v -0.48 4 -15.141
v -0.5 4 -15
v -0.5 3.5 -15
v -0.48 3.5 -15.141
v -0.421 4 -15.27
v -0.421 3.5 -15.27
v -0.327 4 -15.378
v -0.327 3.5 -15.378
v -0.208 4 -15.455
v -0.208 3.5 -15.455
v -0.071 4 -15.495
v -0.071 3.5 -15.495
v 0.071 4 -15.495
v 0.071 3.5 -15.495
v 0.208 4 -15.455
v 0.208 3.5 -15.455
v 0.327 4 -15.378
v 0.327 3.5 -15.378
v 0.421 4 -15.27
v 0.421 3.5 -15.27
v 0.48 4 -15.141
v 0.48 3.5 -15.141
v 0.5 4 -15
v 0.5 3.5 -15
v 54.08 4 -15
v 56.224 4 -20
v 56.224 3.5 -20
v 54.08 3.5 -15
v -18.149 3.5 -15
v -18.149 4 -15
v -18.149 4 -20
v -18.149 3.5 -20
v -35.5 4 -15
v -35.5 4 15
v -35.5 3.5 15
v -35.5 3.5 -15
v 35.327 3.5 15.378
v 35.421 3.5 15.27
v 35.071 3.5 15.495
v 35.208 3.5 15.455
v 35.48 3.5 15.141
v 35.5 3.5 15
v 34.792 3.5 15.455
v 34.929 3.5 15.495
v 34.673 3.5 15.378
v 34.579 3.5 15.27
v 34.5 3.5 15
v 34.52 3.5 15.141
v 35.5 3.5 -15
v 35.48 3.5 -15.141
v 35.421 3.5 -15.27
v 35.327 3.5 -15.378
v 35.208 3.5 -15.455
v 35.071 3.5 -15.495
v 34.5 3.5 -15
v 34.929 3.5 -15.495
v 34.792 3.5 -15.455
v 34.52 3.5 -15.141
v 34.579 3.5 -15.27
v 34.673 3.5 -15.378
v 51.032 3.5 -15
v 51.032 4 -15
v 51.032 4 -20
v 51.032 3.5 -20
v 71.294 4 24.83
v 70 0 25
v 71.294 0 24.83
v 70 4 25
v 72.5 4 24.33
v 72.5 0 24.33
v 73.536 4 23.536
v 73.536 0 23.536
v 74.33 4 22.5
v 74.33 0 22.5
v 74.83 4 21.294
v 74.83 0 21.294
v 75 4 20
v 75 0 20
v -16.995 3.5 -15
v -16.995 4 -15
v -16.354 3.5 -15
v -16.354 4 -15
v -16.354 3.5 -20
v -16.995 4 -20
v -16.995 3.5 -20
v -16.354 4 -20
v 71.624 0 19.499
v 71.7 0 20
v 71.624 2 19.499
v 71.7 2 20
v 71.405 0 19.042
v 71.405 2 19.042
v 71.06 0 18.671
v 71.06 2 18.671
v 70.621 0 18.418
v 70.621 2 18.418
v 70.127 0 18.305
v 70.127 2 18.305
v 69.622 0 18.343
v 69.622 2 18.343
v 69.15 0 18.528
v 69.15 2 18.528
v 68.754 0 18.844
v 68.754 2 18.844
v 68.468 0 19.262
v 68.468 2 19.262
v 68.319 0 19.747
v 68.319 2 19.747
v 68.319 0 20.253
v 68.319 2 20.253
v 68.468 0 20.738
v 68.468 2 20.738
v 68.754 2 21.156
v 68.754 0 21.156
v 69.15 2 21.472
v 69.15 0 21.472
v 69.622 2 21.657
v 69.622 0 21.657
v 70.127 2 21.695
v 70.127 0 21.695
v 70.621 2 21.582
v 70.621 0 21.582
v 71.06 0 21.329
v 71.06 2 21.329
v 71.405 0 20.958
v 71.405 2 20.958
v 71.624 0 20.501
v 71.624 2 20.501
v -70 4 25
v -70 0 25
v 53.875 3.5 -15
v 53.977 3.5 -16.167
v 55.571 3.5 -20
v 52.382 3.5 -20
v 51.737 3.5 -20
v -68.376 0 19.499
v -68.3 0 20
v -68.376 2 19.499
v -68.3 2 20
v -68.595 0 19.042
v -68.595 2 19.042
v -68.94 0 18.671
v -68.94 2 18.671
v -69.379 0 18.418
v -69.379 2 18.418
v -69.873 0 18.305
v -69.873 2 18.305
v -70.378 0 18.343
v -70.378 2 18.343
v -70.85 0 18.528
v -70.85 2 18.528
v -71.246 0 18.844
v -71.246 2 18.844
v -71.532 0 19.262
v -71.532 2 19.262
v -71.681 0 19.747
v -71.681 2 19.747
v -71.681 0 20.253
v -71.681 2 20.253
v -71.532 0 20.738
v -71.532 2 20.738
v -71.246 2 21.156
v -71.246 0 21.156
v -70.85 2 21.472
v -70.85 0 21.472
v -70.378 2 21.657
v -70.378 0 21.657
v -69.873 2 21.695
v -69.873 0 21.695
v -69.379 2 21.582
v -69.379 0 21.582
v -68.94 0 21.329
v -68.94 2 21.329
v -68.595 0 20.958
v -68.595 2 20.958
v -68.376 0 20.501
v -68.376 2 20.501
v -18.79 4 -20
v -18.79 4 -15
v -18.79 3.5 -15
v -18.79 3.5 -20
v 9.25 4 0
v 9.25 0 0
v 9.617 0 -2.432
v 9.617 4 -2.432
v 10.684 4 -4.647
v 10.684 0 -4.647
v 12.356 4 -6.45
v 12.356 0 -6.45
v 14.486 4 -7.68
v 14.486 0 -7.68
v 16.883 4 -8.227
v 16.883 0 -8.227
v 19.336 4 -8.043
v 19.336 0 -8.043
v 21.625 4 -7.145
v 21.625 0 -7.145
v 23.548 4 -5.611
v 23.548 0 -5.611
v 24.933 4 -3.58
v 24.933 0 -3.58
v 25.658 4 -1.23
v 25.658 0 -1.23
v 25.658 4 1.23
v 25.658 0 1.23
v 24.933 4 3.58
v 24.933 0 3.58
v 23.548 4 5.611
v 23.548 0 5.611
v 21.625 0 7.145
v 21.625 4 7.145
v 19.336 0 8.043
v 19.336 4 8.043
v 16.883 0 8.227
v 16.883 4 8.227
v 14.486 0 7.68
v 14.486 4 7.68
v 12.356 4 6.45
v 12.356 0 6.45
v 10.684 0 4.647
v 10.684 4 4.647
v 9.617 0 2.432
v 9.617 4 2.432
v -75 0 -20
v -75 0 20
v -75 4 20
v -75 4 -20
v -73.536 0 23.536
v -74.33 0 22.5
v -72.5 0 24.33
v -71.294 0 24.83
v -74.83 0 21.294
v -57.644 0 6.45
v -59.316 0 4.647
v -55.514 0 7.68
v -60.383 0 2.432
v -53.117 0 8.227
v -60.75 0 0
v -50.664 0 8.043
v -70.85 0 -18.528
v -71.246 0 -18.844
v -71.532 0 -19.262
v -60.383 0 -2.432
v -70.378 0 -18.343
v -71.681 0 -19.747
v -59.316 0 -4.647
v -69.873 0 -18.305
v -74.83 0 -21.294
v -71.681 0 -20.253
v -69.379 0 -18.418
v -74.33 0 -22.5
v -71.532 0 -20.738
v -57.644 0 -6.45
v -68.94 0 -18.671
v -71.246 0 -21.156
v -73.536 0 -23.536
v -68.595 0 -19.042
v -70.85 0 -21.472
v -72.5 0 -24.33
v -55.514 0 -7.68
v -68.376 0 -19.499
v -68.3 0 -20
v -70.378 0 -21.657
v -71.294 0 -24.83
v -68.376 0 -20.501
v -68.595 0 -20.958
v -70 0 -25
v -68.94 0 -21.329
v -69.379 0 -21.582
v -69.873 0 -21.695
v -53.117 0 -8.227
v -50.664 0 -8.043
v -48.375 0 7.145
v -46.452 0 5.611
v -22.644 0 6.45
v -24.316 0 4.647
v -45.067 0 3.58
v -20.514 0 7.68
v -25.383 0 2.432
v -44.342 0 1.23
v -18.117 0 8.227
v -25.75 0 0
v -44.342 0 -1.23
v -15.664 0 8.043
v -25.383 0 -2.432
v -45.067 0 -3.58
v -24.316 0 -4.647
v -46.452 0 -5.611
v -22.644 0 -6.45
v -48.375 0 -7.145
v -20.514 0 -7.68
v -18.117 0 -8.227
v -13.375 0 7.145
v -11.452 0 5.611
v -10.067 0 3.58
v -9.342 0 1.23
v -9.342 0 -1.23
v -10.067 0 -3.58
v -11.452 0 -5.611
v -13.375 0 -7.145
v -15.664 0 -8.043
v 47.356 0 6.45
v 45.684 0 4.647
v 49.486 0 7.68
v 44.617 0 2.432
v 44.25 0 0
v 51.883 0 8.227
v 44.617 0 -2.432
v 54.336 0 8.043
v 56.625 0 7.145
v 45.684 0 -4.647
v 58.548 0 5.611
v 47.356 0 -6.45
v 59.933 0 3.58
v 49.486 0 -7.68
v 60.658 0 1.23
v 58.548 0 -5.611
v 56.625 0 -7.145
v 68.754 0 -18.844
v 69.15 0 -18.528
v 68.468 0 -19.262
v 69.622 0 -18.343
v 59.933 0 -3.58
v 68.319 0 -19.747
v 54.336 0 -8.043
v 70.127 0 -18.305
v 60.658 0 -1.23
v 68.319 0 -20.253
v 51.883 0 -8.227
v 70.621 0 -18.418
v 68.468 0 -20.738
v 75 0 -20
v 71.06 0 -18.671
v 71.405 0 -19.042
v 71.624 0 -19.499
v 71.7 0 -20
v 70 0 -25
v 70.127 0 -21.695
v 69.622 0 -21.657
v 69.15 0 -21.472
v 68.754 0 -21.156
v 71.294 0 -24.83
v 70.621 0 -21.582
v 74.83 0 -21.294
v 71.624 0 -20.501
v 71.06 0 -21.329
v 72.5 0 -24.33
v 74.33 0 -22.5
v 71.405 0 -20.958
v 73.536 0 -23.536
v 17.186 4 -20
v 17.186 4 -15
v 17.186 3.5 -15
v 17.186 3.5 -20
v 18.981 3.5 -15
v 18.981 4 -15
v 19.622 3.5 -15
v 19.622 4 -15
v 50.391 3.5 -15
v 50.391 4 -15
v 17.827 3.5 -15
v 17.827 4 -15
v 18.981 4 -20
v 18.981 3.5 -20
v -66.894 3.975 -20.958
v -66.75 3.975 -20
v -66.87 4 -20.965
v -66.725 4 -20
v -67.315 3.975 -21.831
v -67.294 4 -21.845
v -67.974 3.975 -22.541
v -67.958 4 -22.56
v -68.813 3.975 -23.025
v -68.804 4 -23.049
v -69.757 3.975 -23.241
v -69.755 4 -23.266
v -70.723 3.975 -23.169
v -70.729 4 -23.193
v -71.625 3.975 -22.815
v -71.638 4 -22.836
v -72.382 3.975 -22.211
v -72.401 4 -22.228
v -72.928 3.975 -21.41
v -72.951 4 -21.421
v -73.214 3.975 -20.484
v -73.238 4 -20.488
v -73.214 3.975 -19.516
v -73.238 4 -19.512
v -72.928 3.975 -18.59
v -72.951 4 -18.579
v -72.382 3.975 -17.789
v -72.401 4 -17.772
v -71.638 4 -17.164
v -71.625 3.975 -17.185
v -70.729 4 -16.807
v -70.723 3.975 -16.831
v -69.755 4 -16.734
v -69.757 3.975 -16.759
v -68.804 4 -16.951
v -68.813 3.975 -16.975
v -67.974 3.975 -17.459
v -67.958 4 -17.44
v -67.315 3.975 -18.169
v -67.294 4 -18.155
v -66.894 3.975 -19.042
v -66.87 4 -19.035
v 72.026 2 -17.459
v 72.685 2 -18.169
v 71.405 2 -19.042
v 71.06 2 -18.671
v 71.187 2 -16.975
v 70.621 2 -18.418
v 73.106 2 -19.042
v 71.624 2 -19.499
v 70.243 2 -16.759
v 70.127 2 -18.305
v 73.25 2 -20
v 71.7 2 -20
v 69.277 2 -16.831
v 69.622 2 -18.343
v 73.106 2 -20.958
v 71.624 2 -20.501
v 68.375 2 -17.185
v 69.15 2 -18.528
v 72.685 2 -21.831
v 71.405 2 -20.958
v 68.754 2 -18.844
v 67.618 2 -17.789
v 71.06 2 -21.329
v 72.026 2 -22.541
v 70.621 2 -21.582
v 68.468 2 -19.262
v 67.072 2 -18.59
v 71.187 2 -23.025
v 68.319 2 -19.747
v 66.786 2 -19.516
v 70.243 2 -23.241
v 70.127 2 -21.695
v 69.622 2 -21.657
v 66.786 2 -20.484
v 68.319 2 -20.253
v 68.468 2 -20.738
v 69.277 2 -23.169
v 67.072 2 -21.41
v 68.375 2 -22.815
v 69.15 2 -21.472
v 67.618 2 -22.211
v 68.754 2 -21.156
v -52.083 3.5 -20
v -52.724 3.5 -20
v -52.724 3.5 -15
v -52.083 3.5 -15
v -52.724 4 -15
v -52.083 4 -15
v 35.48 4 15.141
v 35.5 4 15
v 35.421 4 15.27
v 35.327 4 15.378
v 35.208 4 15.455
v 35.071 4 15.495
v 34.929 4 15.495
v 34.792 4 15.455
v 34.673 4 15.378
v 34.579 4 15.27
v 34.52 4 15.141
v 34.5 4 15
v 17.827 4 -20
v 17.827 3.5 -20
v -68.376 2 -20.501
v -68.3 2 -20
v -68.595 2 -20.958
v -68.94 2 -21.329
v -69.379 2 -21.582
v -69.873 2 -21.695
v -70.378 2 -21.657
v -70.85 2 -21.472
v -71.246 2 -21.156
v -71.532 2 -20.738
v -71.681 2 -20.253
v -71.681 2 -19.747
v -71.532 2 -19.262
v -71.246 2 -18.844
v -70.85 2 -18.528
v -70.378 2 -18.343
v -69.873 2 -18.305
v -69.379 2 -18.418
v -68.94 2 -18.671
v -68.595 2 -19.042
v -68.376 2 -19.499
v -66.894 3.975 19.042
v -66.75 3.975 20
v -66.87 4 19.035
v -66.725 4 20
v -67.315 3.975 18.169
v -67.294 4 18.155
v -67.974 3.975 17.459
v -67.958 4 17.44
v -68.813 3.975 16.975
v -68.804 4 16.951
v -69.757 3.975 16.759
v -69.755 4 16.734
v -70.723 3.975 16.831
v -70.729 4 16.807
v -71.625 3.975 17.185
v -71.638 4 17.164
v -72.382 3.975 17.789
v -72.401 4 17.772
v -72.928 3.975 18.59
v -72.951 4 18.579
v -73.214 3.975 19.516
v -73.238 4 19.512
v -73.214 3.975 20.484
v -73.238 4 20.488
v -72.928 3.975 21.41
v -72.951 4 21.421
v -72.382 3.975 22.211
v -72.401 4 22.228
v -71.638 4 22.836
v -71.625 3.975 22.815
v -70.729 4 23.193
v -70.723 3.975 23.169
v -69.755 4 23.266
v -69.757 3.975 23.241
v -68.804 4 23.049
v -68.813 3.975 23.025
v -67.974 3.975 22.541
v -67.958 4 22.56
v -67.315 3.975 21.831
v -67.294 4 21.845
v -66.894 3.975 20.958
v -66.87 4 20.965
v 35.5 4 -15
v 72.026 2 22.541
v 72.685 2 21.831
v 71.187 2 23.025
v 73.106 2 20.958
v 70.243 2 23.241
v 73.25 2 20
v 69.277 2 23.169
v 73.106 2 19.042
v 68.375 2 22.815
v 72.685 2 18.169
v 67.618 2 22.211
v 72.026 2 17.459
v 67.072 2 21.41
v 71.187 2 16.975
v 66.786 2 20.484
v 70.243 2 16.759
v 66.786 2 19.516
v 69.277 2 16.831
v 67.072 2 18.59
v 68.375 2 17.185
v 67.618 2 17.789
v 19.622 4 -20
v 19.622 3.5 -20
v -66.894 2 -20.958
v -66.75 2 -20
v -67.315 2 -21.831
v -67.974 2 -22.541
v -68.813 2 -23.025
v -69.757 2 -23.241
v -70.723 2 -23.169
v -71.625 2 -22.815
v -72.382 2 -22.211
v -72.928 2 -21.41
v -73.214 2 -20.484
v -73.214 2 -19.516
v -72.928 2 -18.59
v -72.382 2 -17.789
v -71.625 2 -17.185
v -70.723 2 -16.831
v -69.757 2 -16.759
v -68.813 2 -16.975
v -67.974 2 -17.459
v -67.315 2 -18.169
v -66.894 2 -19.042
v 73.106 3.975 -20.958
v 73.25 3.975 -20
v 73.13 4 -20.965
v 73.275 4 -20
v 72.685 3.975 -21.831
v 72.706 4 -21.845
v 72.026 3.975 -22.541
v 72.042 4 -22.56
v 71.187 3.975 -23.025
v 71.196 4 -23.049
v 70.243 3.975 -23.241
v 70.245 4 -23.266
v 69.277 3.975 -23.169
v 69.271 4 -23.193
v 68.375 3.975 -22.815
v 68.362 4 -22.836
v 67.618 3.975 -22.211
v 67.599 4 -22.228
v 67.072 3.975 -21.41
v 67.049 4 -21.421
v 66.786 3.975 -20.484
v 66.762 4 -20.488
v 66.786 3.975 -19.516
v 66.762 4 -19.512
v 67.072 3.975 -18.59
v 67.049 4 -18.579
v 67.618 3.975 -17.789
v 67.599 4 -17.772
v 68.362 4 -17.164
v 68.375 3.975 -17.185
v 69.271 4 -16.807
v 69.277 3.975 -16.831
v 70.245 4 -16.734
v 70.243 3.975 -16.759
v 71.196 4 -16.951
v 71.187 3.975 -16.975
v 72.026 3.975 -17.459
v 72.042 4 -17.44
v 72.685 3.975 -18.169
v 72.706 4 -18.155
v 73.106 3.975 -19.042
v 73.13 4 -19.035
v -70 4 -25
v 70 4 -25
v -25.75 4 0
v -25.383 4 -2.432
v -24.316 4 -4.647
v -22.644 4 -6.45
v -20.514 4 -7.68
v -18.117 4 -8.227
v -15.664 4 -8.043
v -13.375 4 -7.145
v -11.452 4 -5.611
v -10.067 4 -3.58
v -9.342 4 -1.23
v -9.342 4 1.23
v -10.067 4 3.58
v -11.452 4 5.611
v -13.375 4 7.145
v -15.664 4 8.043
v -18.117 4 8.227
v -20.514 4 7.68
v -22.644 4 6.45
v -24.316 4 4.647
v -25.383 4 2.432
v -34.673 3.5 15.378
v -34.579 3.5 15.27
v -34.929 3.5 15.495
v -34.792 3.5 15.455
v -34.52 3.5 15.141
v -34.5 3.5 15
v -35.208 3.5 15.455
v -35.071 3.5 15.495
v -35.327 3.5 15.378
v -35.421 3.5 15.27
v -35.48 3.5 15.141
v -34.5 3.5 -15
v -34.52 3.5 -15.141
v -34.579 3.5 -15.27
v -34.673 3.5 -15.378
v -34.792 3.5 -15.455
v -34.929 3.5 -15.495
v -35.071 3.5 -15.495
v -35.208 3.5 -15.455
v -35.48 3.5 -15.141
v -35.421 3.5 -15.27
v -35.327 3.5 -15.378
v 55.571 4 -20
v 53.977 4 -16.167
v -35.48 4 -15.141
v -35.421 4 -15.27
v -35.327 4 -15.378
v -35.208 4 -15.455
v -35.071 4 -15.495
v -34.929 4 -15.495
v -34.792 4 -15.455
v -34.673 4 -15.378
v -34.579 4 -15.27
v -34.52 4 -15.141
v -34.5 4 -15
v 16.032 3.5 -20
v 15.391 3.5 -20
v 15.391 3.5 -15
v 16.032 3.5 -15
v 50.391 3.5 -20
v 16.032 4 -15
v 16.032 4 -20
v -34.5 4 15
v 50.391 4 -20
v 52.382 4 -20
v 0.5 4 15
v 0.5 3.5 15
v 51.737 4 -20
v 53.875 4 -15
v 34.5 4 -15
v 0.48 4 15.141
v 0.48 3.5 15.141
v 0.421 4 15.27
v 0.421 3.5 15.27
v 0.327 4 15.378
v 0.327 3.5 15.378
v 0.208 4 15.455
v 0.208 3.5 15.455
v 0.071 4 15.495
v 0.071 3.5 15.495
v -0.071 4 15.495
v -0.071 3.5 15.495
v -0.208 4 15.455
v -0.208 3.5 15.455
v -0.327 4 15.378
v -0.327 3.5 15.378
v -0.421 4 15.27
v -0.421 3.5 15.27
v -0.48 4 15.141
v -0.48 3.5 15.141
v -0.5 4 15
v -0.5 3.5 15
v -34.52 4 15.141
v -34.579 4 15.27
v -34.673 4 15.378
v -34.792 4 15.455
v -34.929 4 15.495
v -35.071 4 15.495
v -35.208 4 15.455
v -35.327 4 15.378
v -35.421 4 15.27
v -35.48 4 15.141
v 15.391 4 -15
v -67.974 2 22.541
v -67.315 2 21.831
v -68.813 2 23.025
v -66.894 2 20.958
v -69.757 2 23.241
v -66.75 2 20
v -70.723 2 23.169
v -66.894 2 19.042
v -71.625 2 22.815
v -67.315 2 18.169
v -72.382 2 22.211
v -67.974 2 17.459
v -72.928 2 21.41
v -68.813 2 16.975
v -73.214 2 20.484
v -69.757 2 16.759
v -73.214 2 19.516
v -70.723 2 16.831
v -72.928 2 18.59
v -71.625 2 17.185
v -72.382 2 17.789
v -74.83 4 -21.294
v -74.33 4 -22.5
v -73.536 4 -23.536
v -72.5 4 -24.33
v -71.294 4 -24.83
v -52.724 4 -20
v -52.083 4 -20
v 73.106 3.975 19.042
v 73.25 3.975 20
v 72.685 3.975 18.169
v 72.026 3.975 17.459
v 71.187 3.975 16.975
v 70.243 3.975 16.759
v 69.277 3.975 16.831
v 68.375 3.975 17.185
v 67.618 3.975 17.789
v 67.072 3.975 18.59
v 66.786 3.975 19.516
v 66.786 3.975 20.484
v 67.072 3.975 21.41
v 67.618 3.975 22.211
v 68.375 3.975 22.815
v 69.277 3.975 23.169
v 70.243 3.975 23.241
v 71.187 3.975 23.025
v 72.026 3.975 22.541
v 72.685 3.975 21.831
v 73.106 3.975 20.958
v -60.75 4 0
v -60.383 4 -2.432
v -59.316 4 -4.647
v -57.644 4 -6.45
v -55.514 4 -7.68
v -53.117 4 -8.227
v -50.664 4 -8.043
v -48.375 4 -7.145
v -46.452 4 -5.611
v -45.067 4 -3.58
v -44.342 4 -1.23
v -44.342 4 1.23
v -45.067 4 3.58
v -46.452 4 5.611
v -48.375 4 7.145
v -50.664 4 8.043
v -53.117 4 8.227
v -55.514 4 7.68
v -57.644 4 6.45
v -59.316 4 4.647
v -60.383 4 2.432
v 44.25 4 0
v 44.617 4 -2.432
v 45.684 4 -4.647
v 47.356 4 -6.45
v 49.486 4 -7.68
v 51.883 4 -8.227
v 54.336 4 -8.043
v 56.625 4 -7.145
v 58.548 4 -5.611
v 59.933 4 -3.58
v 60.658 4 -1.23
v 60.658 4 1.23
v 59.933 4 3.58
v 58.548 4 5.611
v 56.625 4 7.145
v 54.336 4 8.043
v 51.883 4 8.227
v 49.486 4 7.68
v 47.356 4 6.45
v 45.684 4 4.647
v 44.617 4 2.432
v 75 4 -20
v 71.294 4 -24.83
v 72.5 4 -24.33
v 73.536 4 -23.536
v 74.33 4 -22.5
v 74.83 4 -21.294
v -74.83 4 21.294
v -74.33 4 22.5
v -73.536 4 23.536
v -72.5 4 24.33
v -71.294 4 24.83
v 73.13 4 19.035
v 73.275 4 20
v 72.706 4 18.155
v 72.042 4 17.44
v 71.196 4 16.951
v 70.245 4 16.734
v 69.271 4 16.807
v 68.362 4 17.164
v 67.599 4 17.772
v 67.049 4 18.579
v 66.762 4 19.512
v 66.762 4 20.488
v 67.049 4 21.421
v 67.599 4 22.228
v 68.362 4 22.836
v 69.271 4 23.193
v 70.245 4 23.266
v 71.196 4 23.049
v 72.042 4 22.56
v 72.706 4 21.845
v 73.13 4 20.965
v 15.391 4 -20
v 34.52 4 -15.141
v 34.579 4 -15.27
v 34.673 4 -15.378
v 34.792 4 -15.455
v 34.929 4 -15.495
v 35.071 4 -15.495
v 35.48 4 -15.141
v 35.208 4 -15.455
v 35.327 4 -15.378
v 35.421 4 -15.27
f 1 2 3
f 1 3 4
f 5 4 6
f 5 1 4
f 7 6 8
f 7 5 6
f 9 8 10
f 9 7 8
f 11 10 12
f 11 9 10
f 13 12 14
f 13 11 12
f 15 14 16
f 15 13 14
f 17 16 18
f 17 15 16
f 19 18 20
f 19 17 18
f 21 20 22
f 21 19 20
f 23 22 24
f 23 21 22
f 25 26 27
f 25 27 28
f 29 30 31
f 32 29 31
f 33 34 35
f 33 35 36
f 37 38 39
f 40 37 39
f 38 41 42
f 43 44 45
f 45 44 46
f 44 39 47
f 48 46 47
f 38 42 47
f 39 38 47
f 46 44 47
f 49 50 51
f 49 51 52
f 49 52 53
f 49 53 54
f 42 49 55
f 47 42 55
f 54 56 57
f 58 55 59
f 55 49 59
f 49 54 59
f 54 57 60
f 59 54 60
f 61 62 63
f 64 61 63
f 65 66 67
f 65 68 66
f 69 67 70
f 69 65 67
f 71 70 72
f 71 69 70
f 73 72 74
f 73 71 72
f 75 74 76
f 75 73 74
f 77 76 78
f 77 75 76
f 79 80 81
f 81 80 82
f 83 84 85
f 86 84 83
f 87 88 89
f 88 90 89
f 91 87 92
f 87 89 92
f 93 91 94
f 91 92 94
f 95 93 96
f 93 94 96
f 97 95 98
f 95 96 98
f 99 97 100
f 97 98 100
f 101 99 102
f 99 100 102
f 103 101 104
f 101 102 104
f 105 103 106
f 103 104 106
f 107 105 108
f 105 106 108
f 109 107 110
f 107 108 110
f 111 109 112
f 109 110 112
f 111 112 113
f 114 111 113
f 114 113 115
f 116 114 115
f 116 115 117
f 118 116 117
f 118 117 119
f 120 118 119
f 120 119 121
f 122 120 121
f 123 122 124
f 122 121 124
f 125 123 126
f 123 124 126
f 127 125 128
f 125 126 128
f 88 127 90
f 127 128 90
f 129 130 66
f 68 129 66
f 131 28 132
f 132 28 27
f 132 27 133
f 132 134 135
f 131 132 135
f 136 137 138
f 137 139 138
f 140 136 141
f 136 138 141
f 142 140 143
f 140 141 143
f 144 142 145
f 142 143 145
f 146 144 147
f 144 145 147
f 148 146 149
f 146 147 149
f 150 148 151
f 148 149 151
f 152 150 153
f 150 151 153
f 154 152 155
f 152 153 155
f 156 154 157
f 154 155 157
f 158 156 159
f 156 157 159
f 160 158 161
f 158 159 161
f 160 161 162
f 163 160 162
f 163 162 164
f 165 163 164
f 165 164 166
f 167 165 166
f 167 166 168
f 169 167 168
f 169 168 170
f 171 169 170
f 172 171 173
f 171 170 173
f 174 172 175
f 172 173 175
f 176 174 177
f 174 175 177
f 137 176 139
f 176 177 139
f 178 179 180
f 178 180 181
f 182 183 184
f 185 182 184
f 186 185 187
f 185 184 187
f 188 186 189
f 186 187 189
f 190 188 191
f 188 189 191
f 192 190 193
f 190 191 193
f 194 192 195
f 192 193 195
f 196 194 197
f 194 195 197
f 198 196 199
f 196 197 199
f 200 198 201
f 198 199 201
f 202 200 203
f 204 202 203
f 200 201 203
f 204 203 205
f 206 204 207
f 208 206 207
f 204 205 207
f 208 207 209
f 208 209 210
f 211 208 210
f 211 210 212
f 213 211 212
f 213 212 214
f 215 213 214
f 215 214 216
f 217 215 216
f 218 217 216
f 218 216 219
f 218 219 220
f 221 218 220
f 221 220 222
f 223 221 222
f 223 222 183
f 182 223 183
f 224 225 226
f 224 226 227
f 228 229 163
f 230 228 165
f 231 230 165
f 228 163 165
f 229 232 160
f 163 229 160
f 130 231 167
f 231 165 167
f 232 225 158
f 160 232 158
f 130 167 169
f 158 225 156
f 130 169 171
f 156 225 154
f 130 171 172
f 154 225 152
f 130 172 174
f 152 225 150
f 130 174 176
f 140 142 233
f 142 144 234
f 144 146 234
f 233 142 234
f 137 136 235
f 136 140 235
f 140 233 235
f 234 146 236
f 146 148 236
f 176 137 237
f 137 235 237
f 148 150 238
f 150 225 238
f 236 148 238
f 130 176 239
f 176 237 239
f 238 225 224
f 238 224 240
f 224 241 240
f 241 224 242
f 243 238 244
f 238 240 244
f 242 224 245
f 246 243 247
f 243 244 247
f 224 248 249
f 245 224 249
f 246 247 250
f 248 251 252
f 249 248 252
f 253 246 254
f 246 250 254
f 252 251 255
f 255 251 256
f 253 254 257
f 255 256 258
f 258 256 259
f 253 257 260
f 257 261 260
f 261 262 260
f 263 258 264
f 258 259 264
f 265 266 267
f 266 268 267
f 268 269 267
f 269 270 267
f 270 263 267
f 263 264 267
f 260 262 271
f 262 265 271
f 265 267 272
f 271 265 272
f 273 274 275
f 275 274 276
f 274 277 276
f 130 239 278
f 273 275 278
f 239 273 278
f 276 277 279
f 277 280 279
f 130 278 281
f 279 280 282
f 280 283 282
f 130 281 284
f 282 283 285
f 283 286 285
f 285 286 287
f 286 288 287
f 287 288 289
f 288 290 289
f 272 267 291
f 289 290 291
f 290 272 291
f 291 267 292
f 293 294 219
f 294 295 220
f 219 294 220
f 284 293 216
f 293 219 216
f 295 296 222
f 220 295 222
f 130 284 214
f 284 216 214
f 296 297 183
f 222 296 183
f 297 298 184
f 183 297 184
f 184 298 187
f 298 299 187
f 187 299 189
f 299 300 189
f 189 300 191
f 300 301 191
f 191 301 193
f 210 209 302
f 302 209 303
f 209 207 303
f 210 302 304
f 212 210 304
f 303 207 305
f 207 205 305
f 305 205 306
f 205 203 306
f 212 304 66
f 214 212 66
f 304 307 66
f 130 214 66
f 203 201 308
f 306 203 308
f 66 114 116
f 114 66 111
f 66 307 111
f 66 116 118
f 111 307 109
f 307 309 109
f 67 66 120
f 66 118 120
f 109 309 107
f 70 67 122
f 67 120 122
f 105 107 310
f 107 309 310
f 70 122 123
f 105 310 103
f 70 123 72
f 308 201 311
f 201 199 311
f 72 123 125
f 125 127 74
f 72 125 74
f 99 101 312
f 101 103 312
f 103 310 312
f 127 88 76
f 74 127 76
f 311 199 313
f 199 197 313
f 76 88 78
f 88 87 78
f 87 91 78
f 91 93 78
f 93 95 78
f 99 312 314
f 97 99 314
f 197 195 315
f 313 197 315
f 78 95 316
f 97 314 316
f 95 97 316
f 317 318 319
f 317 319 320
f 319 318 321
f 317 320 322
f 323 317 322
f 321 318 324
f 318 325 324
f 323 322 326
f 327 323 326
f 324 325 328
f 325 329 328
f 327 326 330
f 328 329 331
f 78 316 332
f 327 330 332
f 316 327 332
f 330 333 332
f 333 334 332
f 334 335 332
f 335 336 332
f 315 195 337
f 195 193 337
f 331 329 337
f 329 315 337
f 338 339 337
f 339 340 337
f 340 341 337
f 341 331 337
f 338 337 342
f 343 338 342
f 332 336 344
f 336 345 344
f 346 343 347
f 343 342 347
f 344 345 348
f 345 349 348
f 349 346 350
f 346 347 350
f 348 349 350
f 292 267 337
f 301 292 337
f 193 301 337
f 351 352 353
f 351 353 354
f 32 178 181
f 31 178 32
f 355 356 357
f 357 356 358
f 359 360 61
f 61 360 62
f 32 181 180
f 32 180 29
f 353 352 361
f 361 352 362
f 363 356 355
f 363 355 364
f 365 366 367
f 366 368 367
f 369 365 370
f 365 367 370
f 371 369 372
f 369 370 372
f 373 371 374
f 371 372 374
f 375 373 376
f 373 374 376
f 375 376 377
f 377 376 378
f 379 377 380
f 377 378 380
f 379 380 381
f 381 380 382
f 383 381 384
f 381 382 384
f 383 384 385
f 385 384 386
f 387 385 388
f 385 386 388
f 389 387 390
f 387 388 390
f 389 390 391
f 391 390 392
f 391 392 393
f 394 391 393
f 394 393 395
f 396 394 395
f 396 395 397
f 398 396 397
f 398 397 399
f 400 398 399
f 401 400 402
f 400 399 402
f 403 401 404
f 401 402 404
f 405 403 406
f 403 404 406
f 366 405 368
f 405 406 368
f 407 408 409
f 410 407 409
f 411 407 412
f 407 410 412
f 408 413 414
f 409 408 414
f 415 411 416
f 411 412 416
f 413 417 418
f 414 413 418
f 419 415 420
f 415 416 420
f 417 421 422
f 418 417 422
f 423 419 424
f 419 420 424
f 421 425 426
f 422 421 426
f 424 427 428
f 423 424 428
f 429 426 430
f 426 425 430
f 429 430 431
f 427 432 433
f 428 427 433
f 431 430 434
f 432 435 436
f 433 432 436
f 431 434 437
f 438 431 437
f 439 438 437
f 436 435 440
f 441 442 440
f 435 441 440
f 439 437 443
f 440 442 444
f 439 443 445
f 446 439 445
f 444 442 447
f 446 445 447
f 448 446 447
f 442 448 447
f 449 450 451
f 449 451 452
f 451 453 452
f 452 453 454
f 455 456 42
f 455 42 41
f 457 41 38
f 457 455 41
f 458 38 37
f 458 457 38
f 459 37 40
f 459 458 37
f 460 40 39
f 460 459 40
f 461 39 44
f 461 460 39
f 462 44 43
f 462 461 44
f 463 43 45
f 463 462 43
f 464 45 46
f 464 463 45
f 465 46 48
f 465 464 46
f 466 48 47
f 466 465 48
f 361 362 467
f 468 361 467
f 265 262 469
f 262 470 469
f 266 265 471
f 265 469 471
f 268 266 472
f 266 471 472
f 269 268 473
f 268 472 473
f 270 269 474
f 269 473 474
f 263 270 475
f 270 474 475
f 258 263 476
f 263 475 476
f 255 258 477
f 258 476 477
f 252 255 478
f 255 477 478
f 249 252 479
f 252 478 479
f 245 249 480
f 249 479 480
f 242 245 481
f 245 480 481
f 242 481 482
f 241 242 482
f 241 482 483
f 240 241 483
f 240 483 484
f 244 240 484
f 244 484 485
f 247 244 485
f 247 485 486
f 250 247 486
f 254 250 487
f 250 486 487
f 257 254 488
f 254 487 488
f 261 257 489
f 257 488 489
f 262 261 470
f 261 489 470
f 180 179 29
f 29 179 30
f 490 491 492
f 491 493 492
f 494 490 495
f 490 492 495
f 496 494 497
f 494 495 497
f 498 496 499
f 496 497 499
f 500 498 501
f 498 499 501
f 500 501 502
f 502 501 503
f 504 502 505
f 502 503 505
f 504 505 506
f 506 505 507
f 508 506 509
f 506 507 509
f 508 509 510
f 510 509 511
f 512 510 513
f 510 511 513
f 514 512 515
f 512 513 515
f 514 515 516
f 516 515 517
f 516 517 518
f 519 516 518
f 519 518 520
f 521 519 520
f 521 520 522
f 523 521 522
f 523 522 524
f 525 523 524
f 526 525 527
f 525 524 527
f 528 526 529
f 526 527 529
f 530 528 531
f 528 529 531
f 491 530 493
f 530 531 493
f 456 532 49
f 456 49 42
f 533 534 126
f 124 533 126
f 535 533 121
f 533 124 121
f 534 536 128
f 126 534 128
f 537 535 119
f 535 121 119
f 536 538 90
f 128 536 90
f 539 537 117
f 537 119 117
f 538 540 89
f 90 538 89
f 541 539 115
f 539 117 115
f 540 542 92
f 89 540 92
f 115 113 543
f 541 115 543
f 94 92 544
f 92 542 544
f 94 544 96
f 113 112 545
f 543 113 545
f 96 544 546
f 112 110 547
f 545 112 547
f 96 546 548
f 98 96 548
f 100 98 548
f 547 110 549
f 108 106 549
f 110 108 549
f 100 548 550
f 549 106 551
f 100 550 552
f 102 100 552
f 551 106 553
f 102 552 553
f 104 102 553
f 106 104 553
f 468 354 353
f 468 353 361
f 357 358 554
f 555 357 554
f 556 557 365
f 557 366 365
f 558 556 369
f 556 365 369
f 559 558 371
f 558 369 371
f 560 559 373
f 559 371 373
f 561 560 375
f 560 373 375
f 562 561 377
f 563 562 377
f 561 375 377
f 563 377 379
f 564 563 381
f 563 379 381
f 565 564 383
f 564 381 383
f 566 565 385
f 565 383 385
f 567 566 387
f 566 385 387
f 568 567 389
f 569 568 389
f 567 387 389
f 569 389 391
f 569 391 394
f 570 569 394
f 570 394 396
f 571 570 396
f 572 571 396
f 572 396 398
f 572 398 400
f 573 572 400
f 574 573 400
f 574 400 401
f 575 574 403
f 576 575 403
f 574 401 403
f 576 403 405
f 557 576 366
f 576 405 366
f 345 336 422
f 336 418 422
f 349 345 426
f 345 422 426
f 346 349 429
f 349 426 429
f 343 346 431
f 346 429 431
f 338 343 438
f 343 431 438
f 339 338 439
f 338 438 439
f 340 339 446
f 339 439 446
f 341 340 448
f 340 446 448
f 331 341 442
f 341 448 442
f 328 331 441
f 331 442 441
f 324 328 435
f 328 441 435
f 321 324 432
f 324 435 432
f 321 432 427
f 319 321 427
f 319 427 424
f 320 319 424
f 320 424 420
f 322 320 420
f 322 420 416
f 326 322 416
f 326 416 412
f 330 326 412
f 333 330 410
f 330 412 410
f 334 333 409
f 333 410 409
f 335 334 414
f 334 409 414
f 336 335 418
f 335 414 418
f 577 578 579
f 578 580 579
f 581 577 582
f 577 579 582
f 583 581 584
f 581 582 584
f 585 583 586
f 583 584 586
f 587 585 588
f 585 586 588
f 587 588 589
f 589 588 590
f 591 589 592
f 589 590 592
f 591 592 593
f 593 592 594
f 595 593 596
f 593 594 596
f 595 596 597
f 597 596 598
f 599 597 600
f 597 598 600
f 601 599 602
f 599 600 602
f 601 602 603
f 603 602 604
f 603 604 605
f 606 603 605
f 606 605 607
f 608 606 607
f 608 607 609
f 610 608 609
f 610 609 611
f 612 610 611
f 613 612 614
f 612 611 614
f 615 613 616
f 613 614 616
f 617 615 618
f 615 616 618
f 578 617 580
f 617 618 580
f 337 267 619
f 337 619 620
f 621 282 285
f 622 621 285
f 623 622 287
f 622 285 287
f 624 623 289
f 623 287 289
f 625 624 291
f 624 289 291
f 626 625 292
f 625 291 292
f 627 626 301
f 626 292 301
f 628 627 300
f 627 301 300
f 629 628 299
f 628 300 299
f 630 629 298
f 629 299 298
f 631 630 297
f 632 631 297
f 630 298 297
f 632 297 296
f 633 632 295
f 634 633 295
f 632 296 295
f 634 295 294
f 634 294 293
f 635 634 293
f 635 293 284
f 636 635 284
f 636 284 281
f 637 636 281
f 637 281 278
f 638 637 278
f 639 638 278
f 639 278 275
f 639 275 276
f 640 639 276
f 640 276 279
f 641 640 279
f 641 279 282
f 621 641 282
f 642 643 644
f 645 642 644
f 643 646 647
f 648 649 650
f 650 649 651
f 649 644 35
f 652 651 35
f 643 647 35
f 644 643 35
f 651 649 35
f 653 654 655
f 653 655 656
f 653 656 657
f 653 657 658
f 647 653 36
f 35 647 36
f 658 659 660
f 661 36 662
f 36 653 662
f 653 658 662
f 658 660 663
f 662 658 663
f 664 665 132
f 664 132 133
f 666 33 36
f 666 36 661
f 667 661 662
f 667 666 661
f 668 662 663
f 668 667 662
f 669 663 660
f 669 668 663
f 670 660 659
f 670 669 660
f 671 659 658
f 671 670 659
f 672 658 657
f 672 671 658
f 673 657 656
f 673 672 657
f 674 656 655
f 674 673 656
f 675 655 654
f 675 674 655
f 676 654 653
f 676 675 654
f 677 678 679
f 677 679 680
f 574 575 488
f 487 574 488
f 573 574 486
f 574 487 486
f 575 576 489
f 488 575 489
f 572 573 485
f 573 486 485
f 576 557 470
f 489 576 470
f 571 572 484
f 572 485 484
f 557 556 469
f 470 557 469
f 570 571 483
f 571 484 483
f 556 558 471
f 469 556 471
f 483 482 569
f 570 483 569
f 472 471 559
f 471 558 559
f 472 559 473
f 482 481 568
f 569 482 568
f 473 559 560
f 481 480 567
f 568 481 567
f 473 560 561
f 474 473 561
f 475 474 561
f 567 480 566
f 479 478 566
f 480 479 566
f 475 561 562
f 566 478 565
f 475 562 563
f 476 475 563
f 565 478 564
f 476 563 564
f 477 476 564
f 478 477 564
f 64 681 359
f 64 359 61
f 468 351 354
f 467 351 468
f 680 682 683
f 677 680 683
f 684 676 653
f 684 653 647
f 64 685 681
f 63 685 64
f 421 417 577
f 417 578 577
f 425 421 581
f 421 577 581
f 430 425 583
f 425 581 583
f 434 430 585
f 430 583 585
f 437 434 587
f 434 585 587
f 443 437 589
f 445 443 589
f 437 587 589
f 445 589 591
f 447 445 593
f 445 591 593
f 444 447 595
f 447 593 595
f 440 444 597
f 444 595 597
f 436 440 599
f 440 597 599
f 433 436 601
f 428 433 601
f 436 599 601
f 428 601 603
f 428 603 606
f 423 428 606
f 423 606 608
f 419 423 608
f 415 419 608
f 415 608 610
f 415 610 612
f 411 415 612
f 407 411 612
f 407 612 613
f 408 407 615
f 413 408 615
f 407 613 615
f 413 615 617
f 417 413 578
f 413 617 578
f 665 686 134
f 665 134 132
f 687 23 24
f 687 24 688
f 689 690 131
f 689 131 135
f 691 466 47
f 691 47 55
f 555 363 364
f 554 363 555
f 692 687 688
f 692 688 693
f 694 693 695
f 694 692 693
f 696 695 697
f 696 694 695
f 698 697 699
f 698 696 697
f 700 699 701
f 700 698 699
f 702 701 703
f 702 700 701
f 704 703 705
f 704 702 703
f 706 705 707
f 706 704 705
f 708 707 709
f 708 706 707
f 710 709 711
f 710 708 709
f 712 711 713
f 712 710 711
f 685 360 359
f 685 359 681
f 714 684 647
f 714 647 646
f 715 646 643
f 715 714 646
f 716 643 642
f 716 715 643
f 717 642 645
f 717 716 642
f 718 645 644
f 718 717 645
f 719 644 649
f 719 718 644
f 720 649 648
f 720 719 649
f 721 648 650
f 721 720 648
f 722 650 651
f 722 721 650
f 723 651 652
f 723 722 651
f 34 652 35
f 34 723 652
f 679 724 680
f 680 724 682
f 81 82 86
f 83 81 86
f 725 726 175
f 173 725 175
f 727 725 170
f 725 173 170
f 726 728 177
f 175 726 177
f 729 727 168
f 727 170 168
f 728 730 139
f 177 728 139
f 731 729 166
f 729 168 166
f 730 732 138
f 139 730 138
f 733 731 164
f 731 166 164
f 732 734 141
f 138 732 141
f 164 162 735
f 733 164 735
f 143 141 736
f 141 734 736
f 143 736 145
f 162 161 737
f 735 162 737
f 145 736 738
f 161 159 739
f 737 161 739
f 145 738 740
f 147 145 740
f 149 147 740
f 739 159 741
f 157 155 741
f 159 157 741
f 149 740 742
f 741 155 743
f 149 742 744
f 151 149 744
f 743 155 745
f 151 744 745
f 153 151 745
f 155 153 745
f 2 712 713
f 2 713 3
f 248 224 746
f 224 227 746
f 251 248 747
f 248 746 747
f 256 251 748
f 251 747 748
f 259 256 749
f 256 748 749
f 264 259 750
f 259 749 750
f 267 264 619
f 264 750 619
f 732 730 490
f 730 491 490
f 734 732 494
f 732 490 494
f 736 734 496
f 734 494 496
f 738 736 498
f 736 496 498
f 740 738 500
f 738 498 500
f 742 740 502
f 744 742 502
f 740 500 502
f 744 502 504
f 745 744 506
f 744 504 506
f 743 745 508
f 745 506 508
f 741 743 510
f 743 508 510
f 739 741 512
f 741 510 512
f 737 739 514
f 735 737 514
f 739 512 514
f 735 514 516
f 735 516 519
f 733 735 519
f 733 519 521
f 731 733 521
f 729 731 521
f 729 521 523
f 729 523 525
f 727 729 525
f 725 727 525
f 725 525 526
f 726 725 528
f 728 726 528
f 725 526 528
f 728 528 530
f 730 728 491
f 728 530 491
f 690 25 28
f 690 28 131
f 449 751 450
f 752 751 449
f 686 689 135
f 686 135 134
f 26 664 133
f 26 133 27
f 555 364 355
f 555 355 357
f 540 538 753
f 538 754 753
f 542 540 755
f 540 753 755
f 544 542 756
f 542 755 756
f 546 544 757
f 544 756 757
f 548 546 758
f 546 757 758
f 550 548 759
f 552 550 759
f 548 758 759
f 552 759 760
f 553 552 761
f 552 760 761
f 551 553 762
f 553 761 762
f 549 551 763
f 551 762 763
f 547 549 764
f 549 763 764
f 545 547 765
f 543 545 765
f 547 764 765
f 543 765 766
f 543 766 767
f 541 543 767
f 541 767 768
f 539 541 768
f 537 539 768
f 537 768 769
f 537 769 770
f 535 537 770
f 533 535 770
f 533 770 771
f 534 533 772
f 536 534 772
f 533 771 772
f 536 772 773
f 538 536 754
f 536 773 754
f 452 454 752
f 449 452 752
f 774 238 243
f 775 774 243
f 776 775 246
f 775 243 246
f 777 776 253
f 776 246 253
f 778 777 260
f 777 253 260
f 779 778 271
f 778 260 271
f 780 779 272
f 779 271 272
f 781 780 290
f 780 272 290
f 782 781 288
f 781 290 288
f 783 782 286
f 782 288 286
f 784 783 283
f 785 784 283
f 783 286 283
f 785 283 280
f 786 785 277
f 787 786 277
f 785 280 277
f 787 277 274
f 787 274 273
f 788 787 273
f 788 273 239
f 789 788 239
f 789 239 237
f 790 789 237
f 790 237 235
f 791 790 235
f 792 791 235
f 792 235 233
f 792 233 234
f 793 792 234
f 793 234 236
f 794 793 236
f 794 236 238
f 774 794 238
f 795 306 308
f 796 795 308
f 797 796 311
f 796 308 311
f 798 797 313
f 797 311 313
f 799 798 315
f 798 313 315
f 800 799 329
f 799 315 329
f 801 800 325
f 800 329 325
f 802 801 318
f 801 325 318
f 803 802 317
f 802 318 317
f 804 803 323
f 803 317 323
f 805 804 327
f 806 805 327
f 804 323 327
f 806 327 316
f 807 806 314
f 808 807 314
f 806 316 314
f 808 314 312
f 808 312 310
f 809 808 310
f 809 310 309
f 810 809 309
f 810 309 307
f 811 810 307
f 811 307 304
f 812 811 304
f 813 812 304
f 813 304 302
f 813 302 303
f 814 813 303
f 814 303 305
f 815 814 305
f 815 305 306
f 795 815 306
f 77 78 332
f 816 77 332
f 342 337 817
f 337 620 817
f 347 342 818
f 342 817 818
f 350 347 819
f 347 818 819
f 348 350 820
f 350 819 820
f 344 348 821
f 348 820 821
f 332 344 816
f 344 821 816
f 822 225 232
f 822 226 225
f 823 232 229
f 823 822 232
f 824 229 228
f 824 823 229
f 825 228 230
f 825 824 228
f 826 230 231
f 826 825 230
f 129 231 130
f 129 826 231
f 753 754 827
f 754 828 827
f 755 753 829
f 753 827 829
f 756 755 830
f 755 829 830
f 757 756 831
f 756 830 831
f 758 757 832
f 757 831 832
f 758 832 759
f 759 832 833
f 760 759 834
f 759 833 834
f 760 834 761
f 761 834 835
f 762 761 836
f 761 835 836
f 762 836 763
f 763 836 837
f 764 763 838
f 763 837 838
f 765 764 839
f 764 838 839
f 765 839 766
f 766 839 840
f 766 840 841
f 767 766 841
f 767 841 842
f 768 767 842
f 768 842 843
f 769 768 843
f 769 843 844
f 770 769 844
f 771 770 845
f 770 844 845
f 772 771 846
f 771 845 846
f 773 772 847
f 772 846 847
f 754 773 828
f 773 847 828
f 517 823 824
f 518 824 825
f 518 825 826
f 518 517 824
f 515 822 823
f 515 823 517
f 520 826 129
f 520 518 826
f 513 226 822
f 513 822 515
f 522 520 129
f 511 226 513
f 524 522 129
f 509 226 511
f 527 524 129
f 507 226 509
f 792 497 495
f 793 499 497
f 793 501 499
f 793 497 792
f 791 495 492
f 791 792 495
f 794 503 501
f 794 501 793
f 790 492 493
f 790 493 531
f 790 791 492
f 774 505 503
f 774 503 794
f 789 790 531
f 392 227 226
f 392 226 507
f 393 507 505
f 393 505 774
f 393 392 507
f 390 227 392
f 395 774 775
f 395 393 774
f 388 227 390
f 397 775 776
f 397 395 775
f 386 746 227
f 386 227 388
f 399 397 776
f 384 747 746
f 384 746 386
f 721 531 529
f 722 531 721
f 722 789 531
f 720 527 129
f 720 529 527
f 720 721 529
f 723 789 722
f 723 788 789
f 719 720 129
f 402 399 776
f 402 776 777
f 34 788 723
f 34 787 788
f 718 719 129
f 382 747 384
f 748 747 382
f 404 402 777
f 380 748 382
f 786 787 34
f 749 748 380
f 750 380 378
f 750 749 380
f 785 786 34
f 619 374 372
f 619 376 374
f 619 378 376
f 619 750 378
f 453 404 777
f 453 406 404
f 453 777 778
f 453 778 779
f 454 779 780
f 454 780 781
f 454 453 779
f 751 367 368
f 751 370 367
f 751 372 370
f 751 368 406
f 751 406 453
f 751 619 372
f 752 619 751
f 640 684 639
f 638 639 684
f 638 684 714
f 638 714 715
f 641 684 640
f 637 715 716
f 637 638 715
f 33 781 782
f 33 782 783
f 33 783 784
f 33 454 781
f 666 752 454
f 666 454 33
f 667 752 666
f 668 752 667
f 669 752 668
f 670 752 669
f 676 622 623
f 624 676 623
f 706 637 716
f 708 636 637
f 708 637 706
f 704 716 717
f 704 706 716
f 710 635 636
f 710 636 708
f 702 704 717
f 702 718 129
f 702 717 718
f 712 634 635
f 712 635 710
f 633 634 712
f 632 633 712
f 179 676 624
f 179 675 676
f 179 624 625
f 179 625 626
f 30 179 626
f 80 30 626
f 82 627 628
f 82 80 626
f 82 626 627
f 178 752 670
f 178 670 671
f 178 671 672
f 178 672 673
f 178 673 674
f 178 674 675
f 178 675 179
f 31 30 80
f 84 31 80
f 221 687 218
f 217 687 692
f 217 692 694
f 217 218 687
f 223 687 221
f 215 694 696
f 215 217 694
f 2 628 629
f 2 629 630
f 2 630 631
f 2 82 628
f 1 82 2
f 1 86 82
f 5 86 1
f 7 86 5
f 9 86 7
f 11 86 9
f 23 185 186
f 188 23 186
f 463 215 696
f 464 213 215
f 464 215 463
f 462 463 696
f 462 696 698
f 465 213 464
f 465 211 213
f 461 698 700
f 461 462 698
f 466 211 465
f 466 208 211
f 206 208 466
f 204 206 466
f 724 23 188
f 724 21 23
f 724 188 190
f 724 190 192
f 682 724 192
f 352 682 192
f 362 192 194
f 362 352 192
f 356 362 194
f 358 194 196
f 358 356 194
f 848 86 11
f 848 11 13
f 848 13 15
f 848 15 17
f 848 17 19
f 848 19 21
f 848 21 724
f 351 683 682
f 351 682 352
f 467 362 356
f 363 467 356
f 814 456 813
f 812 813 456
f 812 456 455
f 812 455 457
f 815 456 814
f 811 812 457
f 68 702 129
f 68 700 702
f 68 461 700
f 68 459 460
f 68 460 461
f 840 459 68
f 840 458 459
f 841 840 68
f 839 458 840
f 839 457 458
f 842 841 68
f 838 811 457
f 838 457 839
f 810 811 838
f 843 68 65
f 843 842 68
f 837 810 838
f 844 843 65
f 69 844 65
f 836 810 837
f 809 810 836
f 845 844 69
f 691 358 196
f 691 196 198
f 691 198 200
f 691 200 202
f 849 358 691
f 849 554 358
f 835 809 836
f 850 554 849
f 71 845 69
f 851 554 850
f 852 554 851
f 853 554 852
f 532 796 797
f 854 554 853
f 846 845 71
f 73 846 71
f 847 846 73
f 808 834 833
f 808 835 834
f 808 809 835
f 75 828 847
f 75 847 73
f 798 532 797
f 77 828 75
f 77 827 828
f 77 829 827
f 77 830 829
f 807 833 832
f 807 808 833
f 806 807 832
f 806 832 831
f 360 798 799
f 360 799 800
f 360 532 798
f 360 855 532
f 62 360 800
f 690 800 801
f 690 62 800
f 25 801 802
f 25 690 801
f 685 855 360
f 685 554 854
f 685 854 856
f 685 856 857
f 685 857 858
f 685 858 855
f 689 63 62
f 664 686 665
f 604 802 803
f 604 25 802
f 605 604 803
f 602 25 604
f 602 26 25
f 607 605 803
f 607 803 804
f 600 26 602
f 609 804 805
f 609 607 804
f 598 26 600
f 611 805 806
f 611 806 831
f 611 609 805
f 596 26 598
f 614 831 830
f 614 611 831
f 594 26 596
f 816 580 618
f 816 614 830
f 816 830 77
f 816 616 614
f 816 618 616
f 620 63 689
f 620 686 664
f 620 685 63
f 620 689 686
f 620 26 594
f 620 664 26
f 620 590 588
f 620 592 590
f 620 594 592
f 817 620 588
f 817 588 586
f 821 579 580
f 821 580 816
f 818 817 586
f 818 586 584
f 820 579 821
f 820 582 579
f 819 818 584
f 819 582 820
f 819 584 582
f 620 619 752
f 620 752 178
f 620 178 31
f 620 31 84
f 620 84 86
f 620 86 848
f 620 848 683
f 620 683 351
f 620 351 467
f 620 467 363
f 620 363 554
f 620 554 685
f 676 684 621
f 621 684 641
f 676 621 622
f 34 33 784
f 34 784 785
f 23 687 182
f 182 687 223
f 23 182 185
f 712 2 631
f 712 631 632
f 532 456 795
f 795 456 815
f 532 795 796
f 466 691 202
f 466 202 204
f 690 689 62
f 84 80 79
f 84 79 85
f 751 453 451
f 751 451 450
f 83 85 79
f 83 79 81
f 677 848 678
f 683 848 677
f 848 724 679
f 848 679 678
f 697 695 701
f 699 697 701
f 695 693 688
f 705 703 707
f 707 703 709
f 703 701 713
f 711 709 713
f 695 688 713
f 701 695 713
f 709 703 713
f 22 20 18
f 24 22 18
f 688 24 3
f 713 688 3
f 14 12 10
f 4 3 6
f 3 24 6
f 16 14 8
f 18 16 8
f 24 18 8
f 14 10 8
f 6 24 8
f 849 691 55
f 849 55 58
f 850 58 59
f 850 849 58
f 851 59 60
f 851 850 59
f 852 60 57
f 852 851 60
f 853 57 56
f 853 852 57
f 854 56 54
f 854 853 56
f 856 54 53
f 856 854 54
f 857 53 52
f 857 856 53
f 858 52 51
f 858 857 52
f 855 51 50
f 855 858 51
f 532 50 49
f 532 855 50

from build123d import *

# Parameters (mm, degrees)
SKETCH1_W              = 150
SKETCH1_H              = 50
BODY_DEPTH             = 4
EDGE_FILLETS_R         = 5
GX16_HOLE_D            = 16.5
GX16_PATTERN_COUNT     = 4
GX16_PATTERN_PITCH     = 35
DESIGN_CUTOUT_SKETCH_W = 0.641025641
DESIGN_CUTOUT_SKETCH_H = 5
DESIGN_CUTOUT_DEPTH    = 0.5


# Read off the part's stored shape, not the designer's step: mounting_holes
with BuildPart() as part:
    # Sketch1 → body (new body)
    with BuildSketch(Plane(origin=(0, 0, 0), x_dir=(1, 0, 0), z_dir=(0, 1, 0))):
        Rectangle(SKETCH1_W, SKETCH1_H)
    extrude(amount=BODY_DEPTH)

    # mounting_holes outline → mounting_holes (revolve, cut)
    with BuildSketch(Plane(origin=(70, 0, 20), x_dir=(1, 0, 0), z_dir=(0, 0, 1))):
        Polygon((0, 0), (1.7, 0), (1.7, 2), (3.25, 2), (3.25, 3.975), (3.275, 4), (0, 4), align=None)
    revolve(axis=Axis((70, 0, 20), (0, 1, 0)), mode=Mode.SUBTRACT)

    # mounting_holes 2 outline → mounting_holes 2 (revolve, cut)
    with BuildSketch(Plane(origin=(-70, 0, -20), x_dir=(1, 0, 0), z_dir=(0, 0, 1))):
        Polygon((0, 4), (0, 0), (1.7, 0), (1.7, 2), (3.25, 2), (3.25, 3.975), (3.275, 4), align=None)
    revolve(axis=Axis((-70, 0, -20), (0, 1, 0)), mode=Mode.SUBTRACT)

    # mounting_holes 3 outline → mounting_holes 3 (revolve, cut)
    with BuildSketch(Plane(origin=(70, 0, -20), x_dir=(1, 0, 0), z_dir=(0, 0, 1))):
        Polygon((0, 4), (0, 0), (1.7, 0), (1.7, 2), (3.25, 2), (3.25, 3.975), (3.275, 4), align=None)
    revolve(axis=Axis((70, 0, -20), (0, 1, 0)), mode=Mode.SUBTRACT)

    # mounting_holes 4 outline → mounting_holes 4 (revolve, cut)
    with BuildSketch(Plane(origin=(-70, 0, 20), x_dir=(1, 0, 0), z_dir=(0, 0, 1))):
        Polygon((0, 4), (0, 0), (1.7, 0), (1.7, 2), (3.25, 2), (3.25, 3.975), (3.275, 4), align=None)
    revolve(axis=Axis((-70, 0, 20), (0, 1, 0)), mode=Mode.SUBTRACT)

    # edge_fillets
    edge_fillets_edges = [part.edges().sort_by_distance(p)[0] for p in [
        (75, 2, 25),
        (-75, 2, 25),
        (-75, 2, -25),
        (75, 2, -25),
    ]]
    fillet(edge_fillets_edges, radius=EDGE_FILLETS_R)

    # gx16_hole (through all)
    with Locations(Plane(origin=(0, 4, 0), x_dir=(1, 0, 0), z_dir=(0, 1, 0))):
        with Locations((-52.5, 0)):
            gx16_hole = Hole(GX16_HOLE_D / 2)

    # gx16_pattern: gx16_hole ×4
    with Locations(*[(i * GX16_PATTERN_PITCH, 0, 0) for i in range(1, GX16_PATTERN_COUNT)]):
        add(gx16_hole, mode=Mode.SUBTRACT)

    # design_cutout_sketch → design_cutout (cut)
    with BuildSketch(Plane(origin=(0, 4, 0), x_dir=(1, 0, 0), z_dir=(0, 1, 0))):
        with BuildLine():
            Line((-34.5, 15), (-34.5, -15))
            ThreePointArc((-34.5, -15), (-35, -15.5), (-35.5, -15))
            Line((-35.5, -15), (-35.5, 15))
            ThreePointArc((-35.5, 15), (-35, 15.5), (-34.5, 15))
        make_face()
        with BuildLine():
            Line((0.5, 15), (0.5, -15))
            ThreePointArc((0.5, -15), (0, -15.5), (-0.5, -15))
            Line((-0.5, -15), (-0.5, 15))
            ThreePointArc((-0.5, 15), (0, 15.5), (0.5, 15))
        make_face()
        with BuildLine():
            Line((35.5, 15), (35.5, -15))
            ThreePointArc((35.5, -15), (35, -15.5), (34.5, -15))
            Line((34.5, -15), (34.5, 15))
            ThreePointArc((34.5, 15), (35, 15.5), (35.5, 15))
        make_face()
        with Locations((-52.403846154, 17.5)):
            Rectangle(DESIGN_CUTOUT_SKETCH_W, DESIGN_CUTOUT_SKETCH_H)
        with Locations((-18.46923077, 17.5)):
            Rectangle(DESIGN_CUTOUT_SKETCH_W, DESIGN_CUTOUT_SKETCH_H)
        with Locations((-16.674358975, 17.5)):
            Rectangle(DESIGN_CUTOUT_SKETCH_W, DESIGN_CUTOUT_SKETCH_H)
        with Locations((15.711538462, 17.5)):
            Rectangle(DESIGN_CUTOUT_SKETCH_W, DESIGN_CUTOUT_SKETCH_H)
        with Locations((17.506410257, 17.5)):
            Rectangle(DESIGN_CUTOUT_SKETCH_W, DESIGN_CUTOUT_SKETCH_H)
        with Locations((19.301282052, 17.5)):
            Rectangle(DESIGN_CUTOUT_SKETCH_W, DESIGN_CUTOUT_SKETCH_H)
        with Locations((50.711538462, 17.5)):
            Rectangle(DESIGN_CUTOUT_SKETCH_W, DESIGN_CUTOUT_SKETCH_H)
        Polygon((51.737179487, 20), (52.382211538, 20), (53.976762821, 16.166866987), (55.571314103, 20), (56.224358974, 20), (54.079927885, 15), (53.874599359, 15), align=None)
    extrude(amount=-DESIGN_CUTOUT_DEPTH, mode=Mode.SUBTRACT)


solid = part.part
